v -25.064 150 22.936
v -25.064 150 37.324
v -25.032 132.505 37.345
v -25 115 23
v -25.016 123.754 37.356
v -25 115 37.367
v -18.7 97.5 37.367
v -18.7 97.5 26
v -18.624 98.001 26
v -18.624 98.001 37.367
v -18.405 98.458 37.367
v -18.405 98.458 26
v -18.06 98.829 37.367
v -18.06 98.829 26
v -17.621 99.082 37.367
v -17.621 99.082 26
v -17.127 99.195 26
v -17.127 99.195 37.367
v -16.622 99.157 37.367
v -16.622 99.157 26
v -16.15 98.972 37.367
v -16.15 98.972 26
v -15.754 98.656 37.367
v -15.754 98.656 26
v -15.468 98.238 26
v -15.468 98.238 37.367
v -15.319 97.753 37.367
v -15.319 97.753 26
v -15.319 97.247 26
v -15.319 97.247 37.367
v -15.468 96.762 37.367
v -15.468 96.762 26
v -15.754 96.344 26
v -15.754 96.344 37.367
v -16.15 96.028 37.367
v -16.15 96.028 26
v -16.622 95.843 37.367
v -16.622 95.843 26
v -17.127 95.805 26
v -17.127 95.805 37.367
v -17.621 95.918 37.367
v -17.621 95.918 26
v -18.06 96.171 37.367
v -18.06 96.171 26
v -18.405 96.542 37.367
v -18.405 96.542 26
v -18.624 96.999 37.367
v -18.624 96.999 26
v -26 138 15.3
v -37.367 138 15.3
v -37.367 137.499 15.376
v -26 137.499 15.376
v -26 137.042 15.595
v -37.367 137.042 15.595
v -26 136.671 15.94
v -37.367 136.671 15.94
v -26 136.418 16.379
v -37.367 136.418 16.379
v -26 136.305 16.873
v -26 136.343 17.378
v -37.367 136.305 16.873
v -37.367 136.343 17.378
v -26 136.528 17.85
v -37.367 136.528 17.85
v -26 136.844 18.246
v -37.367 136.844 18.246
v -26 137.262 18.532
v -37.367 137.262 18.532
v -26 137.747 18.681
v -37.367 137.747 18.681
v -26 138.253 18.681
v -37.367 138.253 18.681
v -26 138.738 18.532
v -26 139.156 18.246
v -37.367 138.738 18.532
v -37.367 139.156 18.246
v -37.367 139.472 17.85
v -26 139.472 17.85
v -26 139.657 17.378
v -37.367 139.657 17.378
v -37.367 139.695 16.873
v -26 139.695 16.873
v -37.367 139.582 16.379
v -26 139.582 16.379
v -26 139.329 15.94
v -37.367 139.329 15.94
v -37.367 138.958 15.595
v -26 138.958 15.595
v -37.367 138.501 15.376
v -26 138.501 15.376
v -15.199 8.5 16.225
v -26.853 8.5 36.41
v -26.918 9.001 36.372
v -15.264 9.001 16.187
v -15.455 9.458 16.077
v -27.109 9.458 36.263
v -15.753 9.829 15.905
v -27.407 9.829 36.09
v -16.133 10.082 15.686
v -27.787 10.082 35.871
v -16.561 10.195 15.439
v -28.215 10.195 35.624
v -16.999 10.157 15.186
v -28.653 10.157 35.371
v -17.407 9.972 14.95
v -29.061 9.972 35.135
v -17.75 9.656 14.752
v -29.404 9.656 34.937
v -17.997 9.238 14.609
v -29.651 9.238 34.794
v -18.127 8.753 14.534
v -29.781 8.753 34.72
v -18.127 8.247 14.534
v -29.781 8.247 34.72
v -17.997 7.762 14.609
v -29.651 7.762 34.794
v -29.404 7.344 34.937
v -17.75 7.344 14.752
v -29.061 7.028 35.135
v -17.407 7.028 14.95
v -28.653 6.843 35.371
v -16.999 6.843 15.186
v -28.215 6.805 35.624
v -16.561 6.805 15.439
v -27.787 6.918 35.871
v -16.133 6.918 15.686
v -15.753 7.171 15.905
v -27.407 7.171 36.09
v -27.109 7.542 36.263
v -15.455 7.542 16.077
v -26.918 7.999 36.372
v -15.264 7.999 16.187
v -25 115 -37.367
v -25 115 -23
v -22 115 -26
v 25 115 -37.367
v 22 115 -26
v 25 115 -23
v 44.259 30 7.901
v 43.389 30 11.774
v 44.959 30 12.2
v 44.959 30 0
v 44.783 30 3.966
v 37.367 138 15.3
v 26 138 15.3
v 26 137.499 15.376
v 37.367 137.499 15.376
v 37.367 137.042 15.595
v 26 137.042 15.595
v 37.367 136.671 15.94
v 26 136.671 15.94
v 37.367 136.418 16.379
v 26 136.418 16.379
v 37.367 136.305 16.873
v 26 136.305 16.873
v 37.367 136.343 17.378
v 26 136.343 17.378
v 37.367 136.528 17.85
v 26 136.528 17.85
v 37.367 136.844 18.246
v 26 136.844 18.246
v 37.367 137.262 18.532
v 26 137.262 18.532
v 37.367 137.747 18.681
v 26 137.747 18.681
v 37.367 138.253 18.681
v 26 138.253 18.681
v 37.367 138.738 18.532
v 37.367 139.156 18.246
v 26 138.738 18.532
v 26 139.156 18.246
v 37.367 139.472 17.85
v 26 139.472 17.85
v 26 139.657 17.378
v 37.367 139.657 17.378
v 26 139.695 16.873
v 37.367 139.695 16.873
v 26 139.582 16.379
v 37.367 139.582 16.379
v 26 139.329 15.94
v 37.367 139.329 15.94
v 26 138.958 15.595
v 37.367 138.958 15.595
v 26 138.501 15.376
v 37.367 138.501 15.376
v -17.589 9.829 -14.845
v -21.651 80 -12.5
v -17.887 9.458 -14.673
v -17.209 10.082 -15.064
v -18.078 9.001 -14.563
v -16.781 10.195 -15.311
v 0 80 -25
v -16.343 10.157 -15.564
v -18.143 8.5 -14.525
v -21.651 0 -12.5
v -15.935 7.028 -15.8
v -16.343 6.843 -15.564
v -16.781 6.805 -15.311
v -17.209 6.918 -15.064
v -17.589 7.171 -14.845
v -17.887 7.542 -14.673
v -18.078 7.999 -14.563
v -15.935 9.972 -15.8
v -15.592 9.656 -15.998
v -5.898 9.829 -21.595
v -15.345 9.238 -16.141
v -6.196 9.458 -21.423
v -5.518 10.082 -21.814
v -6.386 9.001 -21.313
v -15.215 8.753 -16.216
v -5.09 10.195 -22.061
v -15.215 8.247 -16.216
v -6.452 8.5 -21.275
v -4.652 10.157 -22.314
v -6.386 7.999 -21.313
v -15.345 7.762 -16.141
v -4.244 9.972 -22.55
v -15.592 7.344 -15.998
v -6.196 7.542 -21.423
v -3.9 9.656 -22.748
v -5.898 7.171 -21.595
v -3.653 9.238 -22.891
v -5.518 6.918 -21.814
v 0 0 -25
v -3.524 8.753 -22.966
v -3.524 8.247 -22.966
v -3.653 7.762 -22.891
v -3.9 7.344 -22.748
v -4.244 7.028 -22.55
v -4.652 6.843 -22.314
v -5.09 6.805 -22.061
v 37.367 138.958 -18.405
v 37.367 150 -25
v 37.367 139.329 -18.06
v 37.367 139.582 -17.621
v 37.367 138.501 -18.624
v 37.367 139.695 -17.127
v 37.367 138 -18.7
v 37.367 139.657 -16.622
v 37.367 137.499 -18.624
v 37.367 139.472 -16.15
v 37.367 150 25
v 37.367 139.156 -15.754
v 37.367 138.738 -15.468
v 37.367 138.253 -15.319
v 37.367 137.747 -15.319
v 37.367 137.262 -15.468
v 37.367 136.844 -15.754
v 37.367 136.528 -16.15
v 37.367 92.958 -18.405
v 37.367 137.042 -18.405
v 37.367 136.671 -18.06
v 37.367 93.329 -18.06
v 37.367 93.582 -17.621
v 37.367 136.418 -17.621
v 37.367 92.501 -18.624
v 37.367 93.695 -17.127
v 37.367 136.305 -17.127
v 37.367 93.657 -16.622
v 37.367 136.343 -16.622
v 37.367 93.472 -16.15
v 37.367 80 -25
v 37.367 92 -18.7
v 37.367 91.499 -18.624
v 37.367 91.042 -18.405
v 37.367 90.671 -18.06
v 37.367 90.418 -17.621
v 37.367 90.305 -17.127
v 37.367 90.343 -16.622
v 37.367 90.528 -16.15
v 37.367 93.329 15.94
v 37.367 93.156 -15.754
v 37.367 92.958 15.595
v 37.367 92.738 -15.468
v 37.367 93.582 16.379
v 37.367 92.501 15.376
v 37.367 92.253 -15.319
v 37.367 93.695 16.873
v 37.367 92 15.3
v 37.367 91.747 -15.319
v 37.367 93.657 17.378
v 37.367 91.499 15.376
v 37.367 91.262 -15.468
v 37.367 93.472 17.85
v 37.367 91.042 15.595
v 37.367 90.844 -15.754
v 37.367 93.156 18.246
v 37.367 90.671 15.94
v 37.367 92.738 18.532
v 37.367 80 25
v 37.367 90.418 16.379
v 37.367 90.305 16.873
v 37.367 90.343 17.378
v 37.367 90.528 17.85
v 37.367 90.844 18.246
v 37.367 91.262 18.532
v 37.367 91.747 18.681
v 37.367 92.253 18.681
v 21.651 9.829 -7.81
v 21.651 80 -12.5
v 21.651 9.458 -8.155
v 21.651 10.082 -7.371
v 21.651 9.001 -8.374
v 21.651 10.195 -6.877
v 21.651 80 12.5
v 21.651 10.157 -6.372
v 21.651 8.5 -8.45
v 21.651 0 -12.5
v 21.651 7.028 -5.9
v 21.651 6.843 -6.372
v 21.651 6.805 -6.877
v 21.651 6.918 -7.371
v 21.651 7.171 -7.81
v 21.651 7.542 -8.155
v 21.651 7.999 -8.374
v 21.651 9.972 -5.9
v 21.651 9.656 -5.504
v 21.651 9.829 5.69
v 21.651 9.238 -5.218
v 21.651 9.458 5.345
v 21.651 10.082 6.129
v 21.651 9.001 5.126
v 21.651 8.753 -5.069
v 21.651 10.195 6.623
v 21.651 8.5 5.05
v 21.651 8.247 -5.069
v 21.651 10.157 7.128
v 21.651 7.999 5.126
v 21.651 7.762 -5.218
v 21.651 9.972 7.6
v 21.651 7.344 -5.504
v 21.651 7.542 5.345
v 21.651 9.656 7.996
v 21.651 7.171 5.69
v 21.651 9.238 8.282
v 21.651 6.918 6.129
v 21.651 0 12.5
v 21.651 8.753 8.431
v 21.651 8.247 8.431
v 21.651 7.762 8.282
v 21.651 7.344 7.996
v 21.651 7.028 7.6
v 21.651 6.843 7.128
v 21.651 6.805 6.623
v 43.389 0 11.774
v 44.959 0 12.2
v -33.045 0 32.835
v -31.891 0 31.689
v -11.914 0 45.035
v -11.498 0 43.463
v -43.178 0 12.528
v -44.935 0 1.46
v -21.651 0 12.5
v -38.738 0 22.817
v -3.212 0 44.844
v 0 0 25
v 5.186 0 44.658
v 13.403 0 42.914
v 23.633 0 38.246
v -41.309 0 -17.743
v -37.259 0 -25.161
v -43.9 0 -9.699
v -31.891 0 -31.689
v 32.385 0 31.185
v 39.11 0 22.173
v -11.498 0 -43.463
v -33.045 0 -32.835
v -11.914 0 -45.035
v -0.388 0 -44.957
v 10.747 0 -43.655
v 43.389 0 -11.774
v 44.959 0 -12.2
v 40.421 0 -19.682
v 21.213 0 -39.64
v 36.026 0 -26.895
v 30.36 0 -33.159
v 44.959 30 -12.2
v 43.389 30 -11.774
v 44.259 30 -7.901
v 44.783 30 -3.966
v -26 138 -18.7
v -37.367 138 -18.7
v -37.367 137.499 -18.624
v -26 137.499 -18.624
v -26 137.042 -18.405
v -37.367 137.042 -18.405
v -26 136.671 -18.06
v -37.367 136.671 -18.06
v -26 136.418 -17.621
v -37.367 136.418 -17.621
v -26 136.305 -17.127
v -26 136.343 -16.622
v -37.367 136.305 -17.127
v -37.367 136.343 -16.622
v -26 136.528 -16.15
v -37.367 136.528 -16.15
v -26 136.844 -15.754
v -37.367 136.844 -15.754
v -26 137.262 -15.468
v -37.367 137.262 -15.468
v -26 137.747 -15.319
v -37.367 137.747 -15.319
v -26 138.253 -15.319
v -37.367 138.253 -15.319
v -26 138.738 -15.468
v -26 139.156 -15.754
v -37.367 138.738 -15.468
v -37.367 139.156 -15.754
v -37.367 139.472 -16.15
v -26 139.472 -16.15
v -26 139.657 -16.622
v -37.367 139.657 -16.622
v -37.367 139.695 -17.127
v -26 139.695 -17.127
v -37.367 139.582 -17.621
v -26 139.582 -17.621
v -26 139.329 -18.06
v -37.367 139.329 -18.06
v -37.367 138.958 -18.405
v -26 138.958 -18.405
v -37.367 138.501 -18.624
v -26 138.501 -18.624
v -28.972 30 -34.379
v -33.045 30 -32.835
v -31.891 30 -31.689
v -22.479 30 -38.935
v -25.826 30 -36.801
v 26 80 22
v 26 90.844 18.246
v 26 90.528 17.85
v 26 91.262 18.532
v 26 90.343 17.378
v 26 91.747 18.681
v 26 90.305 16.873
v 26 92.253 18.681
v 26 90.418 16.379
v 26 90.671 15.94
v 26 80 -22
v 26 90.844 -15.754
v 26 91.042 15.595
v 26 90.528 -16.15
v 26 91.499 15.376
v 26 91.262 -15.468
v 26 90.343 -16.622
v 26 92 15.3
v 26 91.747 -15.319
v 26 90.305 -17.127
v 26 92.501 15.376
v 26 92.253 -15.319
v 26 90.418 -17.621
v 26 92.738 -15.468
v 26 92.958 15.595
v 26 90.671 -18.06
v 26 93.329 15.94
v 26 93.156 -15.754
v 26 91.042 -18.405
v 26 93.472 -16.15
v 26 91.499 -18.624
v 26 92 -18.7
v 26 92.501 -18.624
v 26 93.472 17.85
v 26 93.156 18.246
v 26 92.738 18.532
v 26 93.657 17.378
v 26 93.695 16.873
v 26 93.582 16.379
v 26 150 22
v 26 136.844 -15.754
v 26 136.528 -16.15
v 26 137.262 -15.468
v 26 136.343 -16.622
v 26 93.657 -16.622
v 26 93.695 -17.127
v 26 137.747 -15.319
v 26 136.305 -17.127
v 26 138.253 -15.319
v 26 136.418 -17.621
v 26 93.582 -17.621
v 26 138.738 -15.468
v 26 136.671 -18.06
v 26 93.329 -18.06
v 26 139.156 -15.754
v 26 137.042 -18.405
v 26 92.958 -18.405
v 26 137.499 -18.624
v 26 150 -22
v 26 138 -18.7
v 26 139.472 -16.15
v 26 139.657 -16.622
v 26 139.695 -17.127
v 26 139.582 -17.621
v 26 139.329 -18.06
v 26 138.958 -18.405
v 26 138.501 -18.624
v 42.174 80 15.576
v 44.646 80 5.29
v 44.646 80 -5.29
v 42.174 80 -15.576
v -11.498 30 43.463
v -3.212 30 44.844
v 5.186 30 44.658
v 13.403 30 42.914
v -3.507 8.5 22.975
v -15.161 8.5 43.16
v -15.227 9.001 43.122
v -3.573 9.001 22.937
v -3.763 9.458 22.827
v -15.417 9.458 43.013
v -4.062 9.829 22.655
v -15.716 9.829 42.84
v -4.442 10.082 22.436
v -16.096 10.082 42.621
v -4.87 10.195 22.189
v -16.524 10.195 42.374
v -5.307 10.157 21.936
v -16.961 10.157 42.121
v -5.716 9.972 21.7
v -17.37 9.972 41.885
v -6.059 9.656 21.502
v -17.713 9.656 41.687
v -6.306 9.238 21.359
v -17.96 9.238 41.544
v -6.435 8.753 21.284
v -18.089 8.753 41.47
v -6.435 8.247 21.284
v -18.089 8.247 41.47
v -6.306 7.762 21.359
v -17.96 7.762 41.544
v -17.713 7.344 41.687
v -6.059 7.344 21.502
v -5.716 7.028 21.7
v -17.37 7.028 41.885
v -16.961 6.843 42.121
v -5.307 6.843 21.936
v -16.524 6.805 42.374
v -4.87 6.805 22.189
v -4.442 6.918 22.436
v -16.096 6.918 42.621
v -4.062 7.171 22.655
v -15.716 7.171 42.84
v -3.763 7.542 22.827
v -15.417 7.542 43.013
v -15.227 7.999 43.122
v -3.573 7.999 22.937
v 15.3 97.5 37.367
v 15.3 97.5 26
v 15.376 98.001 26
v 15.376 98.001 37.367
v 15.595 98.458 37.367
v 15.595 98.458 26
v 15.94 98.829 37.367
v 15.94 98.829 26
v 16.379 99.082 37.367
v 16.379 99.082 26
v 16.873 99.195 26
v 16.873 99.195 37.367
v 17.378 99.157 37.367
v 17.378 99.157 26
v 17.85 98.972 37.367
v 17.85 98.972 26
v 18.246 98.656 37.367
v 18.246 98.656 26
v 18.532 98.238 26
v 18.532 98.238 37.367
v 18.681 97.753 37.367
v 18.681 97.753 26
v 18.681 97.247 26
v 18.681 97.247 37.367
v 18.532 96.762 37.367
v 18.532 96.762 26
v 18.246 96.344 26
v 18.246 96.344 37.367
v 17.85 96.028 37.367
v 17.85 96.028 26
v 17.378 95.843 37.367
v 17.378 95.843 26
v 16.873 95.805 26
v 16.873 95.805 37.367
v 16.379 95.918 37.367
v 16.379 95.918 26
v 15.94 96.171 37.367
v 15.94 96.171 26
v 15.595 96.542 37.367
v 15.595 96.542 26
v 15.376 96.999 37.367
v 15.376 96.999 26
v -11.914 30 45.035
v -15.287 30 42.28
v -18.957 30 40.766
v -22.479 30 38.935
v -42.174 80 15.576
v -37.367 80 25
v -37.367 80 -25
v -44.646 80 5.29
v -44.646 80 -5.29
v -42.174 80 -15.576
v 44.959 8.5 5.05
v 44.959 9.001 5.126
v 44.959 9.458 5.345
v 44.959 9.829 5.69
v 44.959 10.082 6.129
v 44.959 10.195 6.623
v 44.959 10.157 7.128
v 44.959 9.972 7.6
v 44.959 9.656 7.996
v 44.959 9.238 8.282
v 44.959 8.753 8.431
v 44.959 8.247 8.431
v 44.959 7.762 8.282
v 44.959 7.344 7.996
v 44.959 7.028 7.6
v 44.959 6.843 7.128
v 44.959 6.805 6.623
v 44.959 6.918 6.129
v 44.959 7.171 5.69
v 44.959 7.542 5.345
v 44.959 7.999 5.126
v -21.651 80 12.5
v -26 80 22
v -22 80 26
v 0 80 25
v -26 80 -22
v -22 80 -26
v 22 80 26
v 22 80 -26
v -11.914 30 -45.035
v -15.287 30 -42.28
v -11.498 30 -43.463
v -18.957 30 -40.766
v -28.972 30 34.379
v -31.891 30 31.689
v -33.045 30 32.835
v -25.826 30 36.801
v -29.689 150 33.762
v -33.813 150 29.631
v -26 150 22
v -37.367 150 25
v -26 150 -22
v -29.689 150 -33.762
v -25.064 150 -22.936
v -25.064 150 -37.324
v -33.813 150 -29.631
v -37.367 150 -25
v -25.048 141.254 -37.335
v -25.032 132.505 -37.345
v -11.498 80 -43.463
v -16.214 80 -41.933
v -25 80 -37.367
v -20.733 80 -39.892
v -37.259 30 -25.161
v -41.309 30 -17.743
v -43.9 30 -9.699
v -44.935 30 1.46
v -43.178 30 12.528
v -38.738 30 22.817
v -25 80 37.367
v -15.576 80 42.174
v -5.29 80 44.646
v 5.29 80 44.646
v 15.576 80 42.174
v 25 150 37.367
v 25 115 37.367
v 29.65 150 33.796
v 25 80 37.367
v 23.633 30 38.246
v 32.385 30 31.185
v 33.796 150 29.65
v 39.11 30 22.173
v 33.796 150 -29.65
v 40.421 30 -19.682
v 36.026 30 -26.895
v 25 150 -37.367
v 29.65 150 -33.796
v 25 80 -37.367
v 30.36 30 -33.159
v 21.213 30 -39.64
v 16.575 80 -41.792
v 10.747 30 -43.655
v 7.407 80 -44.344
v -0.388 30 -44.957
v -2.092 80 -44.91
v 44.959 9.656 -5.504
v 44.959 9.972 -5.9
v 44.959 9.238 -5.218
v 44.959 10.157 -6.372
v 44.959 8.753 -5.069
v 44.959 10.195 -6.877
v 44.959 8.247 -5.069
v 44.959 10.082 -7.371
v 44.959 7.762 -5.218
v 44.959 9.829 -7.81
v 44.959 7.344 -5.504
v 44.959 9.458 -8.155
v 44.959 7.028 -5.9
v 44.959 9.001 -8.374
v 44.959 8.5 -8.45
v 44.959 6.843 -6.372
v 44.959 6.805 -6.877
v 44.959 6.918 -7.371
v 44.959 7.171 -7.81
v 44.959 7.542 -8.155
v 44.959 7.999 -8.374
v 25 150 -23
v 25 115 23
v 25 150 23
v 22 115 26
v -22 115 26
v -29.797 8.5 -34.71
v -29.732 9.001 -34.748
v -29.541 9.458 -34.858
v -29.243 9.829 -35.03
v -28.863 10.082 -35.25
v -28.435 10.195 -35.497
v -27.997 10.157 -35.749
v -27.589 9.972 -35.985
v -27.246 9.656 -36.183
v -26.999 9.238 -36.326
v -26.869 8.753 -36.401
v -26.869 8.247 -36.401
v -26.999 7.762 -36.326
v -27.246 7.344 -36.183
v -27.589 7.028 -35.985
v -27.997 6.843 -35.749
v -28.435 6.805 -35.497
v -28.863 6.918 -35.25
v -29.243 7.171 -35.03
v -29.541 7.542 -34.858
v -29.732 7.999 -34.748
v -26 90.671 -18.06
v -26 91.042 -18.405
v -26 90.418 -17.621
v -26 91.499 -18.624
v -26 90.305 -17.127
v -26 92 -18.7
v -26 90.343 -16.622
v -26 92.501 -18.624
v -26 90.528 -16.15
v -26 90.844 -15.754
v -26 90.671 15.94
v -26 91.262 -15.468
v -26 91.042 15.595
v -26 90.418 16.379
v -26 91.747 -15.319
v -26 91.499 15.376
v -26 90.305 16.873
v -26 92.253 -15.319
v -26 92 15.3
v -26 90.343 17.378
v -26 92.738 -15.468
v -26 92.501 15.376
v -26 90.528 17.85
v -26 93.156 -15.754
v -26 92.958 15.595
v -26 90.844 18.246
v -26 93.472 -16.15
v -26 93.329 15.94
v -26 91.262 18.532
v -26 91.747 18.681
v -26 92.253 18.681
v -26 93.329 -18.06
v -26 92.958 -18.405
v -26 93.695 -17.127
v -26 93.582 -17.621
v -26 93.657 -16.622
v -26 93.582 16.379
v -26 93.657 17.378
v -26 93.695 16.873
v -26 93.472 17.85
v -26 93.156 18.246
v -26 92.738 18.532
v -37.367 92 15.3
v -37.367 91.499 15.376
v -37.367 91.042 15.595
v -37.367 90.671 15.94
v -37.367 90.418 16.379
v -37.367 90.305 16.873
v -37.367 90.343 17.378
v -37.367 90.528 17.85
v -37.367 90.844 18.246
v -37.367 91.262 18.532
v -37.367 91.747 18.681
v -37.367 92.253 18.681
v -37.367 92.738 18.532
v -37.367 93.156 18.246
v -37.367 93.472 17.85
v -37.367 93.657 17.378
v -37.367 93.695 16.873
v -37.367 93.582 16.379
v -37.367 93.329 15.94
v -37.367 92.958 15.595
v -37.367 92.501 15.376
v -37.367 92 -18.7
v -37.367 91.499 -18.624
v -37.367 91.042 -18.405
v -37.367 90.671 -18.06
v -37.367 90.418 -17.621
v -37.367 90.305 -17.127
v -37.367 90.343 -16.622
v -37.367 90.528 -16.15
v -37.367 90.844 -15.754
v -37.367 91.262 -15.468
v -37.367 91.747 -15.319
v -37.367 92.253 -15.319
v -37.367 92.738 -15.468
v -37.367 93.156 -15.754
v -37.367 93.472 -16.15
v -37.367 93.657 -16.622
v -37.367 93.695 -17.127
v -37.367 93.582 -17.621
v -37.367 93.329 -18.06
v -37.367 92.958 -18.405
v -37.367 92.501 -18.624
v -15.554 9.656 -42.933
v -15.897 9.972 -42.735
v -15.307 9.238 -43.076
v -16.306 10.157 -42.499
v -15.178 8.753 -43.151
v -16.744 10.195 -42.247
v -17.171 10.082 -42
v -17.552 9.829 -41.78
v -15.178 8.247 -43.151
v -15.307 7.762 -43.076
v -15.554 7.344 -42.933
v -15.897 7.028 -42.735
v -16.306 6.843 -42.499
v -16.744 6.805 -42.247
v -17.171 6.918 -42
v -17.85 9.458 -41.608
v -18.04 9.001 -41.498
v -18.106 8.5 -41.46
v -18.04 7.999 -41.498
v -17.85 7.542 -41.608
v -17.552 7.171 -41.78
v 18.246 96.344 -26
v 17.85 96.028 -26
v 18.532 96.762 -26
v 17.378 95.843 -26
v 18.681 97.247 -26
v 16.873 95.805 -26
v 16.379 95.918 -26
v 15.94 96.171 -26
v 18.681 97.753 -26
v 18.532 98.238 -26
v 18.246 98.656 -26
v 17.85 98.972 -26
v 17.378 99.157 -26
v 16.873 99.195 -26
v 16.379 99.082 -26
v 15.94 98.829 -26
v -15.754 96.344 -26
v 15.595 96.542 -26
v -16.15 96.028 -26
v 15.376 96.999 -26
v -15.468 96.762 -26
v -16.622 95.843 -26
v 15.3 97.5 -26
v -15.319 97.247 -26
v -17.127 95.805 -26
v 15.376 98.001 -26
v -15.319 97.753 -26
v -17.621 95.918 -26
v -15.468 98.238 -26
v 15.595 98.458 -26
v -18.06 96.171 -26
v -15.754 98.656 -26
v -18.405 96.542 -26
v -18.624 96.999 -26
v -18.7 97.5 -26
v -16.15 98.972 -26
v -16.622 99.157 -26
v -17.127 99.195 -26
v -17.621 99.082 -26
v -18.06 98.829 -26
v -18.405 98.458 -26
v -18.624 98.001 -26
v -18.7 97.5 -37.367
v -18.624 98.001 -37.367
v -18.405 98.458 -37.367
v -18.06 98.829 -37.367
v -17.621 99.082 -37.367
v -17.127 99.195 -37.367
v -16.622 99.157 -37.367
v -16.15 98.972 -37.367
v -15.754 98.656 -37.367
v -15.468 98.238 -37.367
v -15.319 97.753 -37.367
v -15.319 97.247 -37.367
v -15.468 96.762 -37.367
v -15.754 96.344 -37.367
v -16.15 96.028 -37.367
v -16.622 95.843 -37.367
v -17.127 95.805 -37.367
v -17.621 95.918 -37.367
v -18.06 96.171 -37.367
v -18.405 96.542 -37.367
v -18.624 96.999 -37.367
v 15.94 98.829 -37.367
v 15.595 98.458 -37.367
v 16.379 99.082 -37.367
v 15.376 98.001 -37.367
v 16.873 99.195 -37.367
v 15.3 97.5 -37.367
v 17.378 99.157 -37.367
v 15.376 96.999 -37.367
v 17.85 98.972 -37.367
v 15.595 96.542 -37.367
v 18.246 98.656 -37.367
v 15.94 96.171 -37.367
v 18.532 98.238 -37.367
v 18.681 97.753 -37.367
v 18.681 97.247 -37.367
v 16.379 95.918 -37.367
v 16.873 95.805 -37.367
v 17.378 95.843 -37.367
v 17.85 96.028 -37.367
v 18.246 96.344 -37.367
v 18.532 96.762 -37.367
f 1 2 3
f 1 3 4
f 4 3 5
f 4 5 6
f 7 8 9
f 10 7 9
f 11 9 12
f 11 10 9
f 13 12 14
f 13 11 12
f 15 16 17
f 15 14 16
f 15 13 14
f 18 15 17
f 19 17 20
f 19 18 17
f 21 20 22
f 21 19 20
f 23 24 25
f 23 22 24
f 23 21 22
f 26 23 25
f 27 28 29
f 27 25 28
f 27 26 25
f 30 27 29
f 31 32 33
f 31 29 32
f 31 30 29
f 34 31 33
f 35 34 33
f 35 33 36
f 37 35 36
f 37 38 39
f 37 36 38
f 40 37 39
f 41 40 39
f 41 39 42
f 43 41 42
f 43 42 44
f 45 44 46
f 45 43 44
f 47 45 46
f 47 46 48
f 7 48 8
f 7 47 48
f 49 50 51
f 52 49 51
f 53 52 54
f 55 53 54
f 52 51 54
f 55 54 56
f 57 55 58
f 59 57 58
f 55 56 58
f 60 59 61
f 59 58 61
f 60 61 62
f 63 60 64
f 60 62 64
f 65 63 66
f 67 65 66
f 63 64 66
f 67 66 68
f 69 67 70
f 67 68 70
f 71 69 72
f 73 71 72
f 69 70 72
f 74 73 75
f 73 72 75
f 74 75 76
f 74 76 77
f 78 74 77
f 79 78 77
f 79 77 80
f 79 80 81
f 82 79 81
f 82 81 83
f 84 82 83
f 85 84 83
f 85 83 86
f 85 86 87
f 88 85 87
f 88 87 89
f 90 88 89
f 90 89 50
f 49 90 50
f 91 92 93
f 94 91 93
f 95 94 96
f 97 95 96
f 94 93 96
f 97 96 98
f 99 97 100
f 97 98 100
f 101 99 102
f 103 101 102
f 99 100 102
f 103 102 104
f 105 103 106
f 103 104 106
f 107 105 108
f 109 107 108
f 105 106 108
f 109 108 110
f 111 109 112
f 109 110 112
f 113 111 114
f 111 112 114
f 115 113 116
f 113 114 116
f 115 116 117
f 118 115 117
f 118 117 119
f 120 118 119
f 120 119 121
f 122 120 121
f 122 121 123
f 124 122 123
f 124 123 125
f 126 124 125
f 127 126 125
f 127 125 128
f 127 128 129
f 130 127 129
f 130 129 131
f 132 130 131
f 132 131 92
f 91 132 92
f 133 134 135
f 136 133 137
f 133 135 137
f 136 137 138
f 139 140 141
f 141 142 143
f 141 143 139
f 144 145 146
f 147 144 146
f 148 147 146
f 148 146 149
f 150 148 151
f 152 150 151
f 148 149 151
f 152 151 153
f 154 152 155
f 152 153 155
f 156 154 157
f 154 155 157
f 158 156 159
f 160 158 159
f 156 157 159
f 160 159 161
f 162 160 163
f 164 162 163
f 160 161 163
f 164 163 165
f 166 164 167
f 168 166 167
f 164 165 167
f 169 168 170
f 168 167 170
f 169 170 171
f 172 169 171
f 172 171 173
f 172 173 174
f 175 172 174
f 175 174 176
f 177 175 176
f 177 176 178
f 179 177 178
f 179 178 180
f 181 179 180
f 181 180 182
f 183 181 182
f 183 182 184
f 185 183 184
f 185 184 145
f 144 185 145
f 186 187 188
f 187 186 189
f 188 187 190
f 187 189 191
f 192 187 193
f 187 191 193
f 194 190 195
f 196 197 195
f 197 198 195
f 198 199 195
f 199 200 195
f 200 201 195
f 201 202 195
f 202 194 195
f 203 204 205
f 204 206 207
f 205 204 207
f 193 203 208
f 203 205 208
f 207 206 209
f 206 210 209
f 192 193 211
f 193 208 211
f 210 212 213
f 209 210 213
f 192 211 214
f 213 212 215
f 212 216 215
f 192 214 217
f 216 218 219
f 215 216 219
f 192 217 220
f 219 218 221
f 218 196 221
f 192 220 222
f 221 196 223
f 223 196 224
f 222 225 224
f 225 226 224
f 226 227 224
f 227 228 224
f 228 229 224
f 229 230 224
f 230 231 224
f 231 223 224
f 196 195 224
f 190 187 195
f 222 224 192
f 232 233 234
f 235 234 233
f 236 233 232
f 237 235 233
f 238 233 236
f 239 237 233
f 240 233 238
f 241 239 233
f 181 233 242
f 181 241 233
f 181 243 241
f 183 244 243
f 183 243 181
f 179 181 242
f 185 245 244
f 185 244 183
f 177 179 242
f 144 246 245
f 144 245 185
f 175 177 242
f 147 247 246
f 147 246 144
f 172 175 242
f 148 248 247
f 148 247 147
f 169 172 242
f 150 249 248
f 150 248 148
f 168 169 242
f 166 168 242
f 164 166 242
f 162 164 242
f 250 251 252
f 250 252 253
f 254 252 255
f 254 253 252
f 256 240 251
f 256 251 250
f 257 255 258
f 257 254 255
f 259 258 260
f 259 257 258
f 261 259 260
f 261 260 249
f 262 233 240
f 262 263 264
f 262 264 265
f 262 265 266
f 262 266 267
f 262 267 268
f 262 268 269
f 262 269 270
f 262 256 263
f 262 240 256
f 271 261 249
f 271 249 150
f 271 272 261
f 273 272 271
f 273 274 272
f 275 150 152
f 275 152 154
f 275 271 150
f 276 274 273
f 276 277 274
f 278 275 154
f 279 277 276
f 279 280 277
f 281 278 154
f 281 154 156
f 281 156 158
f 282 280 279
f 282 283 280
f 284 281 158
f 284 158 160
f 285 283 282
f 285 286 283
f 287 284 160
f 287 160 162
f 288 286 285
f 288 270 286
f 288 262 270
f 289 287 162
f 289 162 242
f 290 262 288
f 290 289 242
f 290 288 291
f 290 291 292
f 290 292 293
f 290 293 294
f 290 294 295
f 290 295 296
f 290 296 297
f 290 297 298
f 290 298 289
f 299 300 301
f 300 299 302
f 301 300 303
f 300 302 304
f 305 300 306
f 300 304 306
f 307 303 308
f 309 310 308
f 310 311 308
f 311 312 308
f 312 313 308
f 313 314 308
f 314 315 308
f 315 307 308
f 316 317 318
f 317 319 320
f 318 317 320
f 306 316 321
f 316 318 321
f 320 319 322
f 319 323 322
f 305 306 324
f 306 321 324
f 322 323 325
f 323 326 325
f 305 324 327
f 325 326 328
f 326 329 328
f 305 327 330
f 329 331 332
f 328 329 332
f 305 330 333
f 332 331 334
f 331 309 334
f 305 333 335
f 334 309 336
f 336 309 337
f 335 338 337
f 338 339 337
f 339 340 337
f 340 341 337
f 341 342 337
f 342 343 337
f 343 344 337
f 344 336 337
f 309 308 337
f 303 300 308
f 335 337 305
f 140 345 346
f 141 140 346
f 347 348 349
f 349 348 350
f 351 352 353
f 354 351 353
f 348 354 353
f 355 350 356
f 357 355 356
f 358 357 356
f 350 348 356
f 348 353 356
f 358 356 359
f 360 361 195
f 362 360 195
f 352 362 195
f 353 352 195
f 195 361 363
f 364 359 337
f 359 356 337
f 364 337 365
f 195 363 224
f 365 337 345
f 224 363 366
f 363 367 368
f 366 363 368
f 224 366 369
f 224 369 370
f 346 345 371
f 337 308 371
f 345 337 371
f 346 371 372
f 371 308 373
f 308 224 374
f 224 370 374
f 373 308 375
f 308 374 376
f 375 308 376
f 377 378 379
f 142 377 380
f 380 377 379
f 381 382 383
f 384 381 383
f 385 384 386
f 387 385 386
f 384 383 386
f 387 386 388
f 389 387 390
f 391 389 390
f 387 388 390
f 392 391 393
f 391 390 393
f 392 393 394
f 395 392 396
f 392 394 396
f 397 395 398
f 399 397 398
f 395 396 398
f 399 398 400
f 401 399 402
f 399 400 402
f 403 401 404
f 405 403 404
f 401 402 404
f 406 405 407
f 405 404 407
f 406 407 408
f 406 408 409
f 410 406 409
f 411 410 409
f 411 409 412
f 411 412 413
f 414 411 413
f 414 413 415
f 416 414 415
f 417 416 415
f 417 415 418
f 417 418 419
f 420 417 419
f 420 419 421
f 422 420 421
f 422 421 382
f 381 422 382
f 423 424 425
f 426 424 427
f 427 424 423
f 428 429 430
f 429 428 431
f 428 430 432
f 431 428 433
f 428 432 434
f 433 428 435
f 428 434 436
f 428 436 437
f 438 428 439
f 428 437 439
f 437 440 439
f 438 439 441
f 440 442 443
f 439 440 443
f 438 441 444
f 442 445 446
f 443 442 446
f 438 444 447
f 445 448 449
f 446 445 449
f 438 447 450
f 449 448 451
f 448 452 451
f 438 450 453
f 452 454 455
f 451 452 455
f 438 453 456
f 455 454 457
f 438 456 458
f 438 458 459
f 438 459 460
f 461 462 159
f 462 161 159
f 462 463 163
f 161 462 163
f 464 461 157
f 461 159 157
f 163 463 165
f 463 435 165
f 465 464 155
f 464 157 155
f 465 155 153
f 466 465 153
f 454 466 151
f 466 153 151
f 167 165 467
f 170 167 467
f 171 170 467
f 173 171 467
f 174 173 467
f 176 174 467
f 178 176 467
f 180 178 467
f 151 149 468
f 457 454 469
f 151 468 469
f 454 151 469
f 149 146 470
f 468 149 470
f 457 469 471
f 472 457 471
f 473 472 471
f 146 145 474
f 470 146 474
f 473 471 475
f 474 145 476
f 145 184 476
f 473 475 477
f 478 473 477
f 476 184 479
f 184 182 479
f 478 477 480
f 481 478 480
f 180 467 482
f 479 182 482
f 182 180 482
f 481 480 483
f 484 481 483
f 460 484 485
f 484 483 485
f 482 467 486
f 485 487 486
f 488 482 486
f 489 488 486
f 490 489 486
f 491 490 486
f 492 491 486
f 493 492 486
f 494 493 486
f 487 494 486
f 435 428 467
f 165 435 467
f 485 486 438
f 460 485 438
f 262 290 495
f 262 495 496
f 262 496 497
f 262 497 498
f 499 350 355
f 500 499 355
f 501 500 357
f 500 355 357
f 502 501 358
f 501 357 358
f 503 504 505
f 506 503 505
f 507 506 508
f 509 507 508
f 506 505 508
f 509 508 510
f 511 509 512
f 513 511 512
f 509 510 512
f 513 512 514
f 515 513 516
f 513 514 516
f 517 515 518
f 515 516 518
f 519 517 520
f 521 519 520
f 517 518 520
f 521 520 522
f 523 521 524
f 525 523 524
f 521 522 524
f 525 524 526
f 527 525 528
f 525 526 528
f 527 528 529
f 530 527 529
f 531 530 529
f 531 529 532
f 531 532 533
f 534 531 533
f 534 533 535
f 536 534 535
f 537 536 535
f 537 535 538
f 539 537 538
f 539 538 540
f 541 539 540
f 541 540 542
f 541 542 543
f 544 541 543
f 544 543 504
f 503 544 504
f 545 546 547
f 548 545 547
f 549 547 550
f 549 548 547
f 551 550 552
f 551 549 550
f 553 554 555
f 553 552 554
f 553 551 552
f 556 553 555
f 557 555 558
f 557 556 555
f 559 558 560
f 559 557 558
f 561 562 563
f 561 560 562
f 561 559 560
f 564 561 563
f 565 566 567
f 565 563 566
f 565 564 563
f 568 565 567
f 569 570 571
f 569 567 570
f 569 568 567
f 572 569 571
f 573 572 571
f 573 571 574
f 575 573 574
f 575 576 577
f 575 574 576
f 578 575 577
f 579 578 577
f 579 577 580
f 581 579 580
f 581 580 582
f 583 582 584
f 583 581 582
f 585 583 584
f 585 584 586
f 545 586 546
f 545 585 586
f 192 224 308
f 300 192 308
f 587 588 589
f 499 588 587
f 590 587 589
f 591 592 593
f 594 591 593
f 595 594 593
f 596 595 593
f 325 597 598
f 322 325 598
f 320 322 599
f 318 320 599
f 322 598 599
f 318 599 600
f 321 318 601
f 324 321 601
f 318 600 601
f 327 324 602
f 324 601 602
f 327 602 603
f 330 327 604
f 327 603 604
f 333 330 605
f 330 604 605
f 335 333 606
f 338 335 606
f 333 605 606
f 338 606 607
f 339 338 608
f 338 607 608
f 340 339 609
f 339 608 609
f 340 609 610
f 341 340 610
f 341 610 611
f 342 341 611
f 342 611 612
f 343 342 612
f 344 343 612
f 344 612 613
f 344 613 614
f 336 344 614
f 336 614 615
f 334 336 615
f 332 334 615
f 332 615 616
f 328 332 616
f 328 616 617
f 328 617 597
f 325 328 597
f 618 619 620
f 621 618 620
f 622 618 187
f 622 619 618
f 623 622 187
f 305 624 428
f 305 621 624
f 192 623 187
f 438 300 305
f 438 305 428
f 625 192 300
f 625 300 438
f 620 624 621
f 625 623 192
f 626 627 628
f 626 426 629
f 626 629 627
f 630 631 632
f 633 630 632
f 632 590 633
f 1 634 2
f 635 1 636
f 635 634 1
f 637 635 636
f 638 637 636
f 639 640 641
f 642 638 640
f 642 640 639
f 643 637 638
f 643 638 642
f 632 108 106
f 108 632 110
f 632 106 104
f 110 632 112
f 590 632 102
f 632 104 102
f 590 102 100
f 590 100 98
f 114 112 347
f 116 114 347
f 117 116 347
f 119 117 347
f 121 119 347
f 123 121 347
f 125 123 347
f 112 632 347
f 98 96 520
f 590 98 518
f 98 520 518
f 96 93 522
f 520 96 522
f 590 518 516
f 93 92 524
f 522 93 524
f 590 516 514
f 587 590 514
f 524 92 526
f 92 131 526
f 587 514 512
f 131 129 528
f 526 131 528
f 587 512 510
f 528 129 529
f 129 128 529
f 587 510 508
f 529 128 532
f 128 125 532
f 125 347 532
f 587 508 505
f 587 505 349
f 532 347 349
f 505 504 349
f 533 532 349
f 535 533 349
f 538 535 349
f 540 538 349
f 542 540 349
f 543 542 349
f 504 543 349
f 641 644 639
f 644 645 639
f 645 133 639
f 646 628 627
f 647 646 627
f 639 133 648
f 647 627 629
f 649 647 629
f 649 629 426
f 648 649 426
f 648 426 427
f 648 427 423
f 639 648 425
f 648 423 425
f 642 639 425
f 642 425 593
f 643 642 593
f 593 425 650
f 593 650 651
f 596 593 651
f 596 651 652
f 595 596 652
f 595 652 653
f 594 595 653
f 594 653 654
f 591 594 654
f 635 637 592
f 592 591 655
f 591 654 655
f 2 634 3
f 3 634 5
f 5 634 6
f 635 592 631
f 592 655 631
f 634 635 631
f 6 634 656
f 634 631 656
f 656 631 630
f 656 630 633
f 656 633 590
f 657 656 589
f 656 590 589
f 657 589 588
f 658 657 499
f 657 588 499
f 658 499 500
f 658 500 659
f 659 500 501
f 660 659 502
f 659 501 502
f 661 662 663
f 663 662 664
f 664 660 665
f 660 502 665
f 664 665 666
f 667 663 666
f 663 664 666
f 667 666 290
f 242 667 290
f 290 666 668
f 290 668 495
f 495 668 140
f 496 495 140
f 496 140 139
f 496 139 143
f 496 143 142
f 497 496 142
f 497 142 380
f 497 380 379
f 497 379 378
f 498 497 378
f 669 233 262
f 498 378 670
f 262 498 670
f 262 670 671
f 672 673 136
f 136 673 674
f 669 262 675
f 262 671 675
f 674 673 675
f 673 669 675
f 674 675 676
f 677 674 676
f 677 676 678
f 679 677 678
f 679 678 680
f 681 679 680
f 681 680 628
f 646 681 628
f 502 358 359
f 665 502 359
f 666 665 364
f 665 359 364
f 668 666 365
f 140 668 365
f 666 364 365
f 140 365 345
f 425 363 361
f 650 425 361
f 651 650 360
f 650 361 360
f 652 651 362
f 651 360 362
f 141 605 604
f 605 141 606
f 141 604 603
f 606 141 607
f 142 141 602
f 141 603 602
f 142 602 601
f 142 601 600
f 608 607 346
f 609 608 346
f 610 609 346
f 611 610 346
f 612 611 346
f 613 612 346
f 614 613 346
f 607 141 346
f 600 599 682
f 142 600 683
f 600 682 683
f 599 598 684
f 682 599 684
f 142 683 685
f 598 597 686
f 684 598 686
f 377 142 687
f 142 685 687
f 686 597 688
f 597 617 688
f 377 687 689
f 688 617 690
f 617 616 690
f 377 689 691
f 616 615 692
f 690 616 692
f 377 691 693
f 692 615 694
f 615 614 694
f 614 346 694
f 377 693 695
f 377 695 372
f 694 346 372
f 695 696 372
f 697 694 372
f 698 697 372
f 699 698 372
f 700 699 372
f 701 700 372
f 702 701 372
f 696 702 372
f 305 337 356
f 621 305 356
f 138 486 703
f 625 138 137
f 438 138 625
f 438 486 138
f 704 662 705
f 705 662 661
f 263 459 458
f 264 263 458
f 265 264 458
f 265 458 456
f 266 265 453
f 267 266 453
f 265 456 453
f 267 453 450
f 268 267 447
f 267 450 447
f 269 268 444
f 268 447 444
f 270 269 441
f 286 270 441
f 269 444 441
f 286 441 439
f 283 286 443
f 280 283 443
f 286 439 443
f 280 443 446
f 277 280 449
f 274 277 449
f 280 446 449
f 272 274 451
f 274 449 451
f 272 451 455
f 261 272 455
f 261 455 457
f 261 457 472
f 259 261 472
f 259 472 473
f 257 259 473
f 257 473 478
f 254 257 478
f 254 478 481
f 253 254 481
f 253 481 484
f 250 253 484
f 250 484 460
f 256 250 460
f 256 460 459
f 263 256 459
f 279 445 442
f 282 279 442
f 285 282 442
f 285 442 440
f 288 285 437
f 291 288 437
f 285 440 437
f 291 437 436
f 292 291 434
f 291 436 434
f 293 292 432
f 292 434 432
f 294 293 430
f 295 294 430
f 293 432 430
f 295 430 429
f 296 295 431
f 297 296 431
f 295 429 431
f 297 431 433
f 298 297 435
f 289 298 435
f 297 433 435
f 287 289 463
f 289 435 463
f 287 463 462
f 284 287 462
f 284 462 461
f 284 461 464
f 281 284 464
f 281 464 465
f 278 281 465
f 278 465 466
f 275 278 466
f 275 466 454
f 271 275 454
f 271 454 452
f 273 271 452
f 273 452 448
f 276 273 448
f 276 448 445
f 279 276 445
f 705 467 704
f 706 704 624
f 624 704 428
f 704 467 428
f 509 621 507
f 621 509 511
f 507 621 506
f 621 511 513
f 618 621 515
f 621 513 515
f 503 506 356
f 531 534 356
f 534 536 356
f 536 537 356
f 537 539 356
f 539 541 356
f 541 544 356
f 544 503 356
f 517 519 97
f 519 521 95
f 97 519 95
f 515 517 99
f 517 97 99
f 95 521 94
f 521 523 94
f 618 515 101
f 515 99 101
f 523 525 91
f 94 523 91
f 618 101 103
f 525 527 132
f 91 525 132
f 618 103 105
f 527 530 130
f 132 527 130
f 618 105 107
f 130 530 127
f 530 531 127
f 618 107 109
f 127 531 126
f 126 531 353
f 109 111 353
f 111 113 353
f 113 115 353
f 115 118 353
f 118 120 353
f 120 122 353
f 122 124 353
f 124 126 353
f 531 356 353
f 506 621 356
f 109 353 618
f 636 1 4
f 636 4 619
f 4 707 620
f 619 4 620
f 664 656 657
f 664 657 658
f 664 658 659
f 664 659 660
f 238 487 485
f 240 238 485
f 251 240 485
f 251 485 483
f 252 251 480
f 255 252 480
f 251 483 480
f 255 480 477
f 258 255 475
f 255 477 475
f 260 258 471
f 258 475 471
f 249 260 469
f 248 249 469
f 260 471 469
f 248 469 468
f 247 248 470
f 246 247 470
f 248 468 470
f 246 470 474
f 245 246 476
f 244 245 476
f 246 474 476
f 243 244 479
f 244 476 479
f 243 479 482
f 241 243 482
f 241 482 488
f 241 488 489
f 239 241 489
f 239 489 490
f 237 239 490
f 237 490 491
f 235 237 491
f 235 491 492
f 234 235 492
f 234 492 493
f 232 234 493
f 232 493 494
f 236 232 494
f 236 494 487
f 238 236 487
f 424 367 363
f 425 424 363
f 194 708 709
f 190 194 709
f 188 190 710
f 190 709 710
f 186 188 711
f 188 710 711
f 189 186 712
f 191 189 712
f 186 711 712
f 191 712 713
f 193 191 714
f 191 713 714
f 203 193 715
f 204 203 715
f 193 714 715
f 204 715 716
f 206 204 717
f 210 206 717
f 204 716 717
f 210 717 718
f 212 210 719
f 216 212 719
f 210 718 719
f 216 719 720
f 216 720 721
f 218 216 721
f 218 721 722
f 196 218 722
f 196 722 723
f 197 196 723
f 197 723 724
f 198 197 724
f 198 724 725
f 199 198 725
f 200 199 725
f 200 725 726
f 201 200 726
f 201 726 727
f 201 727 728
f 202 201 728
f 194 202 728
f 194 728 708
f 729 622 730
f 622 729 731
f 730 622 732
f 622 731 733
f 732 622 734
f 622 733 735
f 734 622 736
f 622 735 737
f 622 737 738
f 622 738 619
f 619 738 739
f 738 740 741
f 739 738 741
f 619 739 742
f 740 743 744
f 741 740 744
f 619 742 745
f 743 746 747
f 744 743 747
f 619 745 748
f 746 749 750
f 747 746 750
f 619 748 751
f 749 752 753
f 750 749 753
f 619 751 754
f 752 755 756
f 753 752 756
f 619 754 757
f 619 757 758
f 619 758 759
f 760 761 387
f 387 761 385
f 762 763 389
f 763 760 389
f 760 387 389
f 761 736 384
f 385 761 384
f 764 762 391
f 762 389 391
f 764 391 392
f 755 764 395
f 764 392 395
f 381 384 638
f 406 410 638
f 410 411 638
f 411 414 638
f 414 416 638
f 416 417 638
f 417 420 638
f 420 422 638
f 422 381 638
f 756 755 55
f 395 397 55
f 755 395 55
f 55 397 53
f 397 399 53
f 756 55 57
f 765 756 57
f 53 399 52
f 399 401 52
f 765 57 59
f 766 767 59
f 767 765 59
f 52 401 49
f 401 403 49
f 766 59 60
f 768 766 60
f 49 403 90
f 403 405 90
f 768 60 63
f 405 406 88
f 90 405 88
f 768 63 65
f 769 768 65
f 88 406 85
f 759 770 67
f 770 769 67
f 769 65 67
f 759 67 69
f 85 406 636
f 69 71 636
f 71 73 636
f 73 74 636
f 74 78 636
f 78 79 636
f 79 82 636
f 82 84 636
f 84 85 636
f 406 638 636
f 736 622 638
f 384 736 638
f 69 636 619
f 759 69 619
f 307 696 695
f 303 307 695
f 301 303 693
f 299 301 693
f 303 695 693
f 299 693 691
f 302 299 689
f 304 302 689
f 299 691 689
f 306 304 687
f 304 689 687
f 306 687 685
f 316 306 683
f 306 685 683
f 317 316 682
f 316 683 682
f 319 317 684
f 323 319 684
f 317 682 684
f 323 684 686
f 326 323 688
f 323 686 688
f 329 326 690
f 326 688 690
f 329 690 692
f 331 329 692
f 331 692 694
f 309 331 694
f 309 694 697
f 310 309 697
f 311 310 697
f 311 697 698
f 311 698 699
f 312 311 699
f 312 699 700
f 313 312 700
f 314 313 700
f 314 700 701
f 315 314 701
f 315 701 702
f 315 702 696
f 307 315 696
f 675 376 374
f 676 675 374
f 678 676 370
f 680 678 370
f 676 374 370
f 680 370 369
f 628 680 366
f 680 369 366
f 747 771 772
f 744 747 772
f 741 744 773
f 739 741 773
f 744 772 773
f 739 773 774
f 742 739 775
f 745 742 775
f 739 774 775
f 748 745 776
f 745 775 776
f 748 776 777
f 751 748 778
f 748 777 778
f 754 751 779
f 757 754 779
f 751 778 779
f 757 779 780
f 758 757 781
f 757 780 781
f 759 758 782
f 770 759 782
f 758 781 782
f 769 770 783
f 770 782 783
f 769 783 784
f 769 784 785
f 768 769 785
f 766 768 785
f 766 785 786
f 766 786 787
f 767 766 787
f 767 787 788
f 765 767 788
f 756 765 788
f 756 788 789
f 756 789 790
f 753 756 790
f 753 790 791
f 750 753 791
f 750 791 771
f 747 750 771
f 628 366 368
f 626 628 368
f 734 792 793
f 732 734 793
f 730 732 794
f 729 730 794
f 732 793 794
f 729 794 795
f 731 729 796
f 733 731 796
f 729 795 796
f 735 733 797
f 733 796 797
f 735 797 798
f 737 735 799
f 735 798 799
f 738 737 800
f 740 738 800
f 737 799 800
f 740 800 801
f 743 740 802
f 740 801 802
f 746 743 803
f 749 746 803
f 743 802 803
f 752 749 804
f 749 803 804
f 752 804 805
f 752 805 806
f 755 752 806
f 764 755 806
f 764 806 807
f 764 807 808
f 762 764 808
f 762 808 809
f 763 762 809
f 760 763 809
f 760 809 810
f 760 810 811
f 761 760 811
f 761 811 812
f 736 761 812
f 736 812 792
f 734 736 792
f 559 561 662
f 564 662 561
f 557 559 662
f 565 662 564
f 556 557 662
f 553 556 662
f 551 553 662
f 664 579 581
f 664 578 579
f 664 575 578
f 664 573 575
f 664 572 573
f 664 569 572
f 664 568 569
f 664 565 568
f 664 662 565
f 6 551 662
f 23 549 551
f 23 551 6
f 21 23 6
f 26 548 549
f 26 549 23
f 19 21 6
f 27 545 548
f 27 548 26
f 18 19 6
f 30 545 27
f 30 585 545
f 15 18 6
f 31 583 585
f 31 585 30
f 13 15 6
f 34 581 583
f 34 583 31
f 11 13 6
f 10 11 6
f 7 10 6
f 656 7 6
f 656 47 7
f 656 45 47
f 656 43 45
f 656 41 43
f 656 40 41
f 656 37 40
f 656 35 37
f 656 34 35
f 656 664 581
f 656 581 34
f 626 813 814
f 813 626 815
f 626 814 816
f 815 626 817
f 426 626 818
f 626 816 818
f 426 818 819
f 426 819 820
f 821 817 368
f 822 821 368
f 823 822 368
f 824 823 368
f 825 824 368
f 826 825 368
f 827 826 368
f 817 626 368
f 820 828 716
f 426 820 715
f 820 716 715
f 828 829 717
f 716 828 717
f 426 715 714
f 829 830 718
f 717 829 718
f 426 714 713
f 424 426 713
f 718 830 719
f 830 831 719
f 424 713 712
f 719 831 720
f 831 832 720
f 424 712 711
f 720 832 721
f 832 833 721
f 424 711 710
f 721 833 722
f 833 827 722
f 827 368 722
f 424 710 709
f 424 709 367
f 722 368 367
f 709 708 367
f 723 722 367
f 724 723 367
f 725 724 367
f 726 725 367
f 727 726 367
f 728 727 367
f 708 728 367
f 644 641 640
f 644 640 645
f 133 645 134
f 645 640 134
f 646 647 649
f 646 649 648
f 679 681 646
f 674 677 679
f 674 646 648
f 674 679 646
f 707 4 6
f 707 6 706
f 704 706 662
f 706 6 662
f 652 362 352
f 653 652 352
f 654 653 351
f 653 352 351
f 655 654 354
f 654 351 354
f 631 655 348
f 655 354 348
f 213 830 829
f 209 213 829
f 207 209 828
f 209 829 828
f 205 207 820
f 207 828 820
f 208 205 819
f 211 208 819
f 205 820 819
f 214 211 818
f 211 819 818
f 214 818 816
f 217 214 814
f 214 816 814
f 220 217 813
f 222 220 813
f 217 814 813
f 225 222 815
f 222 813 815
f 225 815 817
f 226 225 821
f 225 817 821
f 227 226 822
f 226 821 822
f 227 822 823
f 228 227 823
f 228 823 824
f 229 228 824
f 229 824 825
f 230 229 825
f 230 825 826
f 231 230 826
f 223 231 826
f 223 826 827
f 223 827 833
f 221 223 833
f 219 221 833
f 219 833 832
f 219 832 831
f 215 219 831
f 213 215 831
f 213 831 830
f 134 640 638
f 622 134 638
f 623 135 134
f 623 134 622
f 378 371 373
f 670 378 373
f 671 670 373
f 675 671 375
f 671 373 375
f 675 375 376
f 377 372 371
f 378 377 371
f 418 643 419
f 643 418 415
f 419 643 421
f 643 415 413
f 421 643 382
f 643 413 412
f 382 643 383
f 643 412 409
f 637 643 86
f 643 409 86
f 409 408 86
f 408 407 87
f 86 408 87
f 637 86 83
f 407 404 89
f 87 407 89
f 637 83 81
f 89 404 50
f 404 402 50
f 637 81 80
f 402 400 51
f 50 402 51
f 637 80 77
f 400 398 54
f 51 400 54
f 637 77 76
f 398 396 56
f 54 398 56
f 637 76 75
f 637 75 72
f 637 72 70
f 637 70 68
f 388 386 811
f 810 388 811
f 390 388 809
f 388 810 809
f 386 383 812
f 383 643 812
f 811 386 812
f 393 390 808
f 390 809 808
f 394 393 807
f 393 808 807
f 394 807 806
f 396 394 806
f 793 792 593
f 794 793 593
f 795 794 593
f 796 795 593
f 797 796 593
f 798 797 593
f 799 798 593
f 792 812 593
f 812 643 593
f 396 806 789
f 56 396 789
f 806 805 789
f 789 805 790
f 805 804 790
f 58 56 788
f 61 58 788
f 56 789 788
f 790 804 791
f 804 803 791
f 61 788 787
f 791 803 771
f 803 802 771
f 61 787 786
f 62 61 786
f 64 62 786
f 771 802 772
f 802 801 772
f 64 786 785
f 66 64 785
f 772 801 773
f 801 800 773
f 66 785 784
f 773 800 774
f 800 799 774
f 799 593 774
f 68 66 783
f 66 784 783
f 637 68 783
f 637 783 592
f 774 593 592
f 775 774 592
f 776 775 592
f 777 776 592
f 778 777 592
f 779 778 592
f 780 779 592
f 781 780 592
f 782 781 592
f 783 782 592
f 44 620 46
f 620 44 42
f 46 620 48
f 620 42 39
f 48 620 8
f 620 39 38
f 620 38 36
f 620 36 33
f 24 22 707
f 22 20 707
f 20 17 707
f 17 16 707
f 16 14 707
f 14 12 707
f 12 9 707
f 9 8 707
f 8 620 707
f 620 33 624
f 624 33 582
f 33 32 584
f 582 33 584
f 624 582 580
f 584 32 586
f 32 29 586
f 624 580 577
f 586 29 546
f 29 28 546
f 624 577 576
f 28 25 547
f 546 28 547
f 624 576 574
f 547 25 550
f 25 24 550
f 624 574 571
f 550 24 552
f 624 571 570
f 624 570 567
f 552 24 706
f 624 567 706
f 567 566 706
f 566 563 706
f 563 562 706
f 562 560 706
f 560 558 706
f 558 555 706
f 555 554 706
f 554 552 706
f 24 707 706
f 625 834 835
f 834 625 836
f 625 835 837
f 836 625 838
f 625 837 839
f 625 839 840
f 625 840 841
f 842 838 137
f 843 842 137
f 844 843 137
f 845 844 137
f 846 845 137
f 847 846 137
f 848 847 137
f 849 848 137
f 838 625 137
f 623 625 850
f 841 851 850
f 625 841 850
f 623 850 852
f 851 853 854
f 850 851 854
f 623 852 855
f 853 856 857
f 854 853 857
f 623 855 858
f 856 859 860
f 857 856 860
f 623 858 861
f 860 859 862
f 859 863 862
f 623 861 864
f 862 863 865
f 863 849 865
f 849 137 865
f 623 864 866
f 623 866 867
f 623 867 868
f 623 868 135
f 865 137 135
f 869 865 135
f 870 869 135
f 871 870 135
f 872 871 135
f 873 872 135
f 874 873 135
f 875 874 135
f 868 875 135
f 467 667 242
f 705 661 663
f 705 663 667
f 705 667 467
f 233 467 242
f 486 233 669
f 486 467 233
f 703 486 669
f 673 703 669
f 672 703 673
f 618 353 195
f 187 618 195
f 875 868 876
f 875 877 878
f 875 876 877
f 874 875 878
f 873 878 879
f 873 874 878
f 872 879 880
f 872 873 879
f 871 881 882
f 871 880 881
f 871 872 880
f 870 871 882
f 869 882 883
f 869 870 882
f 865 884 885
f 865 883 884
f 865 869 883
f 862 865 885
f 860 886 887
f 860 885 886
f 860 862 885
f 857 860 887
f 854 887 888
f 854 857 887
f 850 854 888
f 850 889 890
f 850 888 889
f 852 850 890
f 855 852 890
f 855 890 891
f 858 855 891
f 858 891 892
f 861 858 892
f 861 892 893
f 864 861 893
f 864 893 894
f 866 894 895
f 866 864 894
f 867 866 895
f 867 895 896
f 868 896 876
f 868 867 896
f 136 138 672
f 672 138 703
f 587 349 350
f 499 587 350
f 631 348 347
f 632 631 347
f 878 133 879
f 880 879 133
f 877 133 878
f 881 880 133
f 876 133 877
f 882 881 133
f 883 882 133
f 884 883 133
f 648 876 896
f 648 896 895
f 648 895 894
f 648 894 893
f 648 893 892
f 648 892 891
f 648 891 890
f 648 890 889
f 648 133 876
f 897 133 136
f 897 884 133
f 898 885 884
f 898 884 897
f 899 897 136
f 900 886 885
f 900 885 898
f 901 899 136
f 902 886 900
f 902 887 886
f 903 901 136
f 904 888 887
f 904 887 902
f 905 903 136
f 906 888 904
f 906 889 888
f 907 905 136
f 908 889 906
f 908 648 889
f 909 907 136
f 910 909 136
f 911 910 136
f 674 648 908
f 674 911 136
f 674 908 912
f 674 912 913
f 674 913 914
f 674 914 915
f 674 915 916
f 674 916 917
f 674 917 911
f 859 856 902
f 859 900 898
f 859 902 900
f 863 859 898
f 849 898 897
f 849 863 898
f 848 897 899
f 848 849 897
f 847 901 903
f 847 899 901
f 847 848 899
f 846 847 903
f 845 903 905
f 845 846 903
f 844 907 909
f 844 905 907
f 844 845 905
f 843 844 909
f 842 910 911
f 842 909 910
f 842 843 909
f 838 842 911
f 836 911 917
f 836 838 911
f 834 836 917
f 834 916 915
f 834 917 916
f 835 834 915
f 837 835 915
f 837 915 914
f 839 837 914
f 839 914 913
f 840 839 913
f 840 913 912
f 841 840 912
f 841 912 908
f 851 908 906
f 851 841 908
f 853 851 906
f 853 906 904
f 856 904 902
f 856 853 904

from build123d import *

# Parameters (mm, degrees)
BOSS_EXTRUDE1_DEPTH      = 30
SKETCH11_R               = 44.958564256
BOSS_EXTRUDE2_DEPTH      = 120
CUT_EXTRUDE1_DEPTH       = 163.940010531
SKETCH20_R               = 1.7
CUT_EXTRUDE13_DEPTH      = 24
SKETCH22_R               = 1.7
CUT_EXTRUDE14_DEPTH      = 24
SKETCH23_R               = 1.7
CUT_EXTRUDE15_DEPTH      = 24
CUT_EXTRUDE21_START      = -70
CUT_EXTRUDE21_DEPTH      = 70
CUT_EXTRUDE22_DEPTH      = 70
CIRPATTERN1_START        = 80
CIRPATTERN1_DEPTH        = 70
CHAMFER1_SIZE            = 4
SKETCH37_R               = 1.7
CUT_EXTRUDE23_DEPTH      = 177.933966729
CUT_EXTRUDE24_DEPTH      = 177.95016312
CUT_EXTRUDE24_DEPTH_BACK = 177.95016312
CUT_EXTRUDE25_DEPTH      = 177.95016312
CUT_EXTRUDE25_DEPTH_BACK = 177.95016312
SKETCH39_R               = 1.7


# Read off the part's stored shape, not the designer's step: CirPattern1
with BuildPart() as part:
    # Sketch2 → Boss-Extrude1 (new body)
    with BuildSketch(Plane(origin=(0, 0, 0), x_dir=(1, 0, 0), z_dir=(0, 1, 0))):
        with BuildLine():
            Line((-33.044792054, -32.835258764), (-11.913772202, -45.035258764))
            Line((-11.913772202, -45.035258764), (-11.497954912, -43.463427532))
            ThreePointArc((-11.497954912, -43.463427532), (0.991222154, -44.947635963), (13.402827335, -42.914295048))
            ThreePointArc((13.402827335, -42.914295048), (32.384657539, -31.185035772), (43.389409835, -11.77419272))
            Line((43.389409835, -11.77419272), (44.958564256, -12.2))
            Line((44.958564256, -12.2), (44.958564256, 12.2))
            Line((44.958564256, 12.2), (43.389409835, 11.77419272))
            ThreePointArc((43.389409835, 11.77419272), (38.393686215, 23.392249973), (30.359999068, 33.159356999))
            ThreePointArc((30.359999068, 33.159356999), (10.7465178, 43.655295843), (-11.497954912, 43.463427532))
            Line((-11.497954912, 43.463427532), (-11.913772202, 45.035258764))
            Line((-11.913772202, 45.035258764), (-33.044792054, 32.835258764))
            Line((-33.044792054, 32.835258764), (-31.891454922, 31.689234812))
            ThreePointArc((-31.891454922, 31.689234812), (-39.458623491, 21.547378777), (-43.899995544, 9.698602542))
            ThreePointArc((-43.899995544, 9.698602542), (-43.177821403, -12.527898422), (-31.891454922, -31.689234812))
            Line((-31.891454922, -31.689234812), (-33.044792054, -32.835258764))
        make_face()
    extrude(amount=BOSS_EXTRUDE1_DEPTH)

    # Sketch11 → Boss-Extrude2 (add)
    with BuildSketch(Plane(origin=(0, 30, 0), x_dir=(1, 0, 0), z_dir=(0, 1, 0))):
        with Locations(Location((0, 0, 0), (0, 0, 104.817769832))):
            Circle(SKETCH11_R)
    extrude(amount=BOSS_EXTRUDE2_DEPTH)

    # Sketch3 → Cut-Extrude1 (cut, through all)
    with BuildSketch(Plane(origin=(0, 0, 0), x_dir=(-1, 0, 0), z_dir=(0, -1, 0))):
        Polygon((21.650635095, 12.5), (0, 25), (-21.650635095, 12.5), (-21.650635095, -12.5), (0, -25), (21.650635095, -12.5), align=None)
    extrude(amount=-CUT_EXTRUDE1_DEPTH, mode=Mode.SUBTRACT)

    # Sketch20 → Cut-Extrude13 (cut)
    with BuildSketch(Plane(origin=(44.958564256, 0, 0), x_dir=(0, 0, -1), z_dir=(1, 0, 0))):
        with Locations((-6.75, 8.5)):
            Circle(SKETCH20_R)
        with Locations((6.75, 8.5)):
            Circle(SKETCH20_R)
    extrude(amount=-CUT_EXTRUDE13_DEPTH, mode=Mode.SUBTRACT)

    # Sketch22 → Cut-Extrude14 (cut)
    with BuildSketch(Plane(origin=(-22.479282128, 0, -38.935258764), x_dir=(-0.8660254037844386, 0, 0.5000000000000003), z_dir=(-0.5000000000000002, 0, -0.8660254037844385))):
        with Locations((6.75, 8.5)):
            Circle(SKETCH22_R)
        with Locations((-6.75, 8.5)):
            Circle(SKETCH22_R)
    extrude(amount=-CUT_EXTRUDE14_DEPTH, mode=Mode.SUBTRACT)

    # Sketch23 → Cut-Extrude15 (cut)
    with BuildSketch(Plane(origin=(-22.479282128, 0, 38.935258764), x_dir=(0.8660254037844386, 0, 0.5), z_dir=(-0.5000000000000001, 0, 0.8660254037844387))):
        with Locations((-6.75, 8.5)):
            Circle(SKETCH23_R)
        with Locations((6.75, 8.5)):
            Circle(SKETCH23_R)
    extrude(amount=-CUT_EXTRUDE15_DEPTH, mode=Mode.SUBTRACT)

    # Sketch35 → Cut-Extrude21 (cut)
    with BuildSketch(Plane(origin=(0, 150, 0), x_dir=(1, 0, 0), z_dir=(0, 1, 0)).offset(CUT_EXTRUDE21_START)):
        with BuildLine():
            Line((-37.366729854, 25), (-37.366729854, -25))
            ThreePointArc((-37.366729854, -25), (-44.958564256, 0), (-37.366729854, 25))
        make_face()
    extrude(amount=CUT_EXTRUDE21_DEPTH, mode=Mode.SUBTRACT)

    # Sketch36 → Cut-Extrude22 (cut)
    with BuildSketch(Plane(origin=(0, 150, 0), x_dir=(1, 0, 0), z_dir=(0, 1, 0))):
        Polygon((-26, 26), (-26, 0), (-26, -26), (0, -26), (26, -26), (26, 0), (26, 26), (0, 26), align=None)
    extrude(amount=-CUT_EXTRUDE22_DEPTH, mode=Mode.SUBTRACT)

    # CirPattern1 outline → CirPattern1 (cut)
    with BuildSketch(Plane(origin=(0, 0, 0), x_dir=(1, 0, 0), z_dir=(0, 1, 0)).offset(CIRPATTERN1_START)):
        with BuildLine():
            Line((25, -37.366729854), (-25, -37.366729854))
            ThreePointArc((-25, -37.366729854), (0, -44.958564256), (25, -37.366729854))
        make_face()
        with BuildLine():
            ThreePointArc((25, 37.366729854), (0, 44.958564256), (-25, 37.366729854))
            Line((-25, 37.366729854), (25, 37.366729854))
        make_face()
        with BuildLine():
            Line((37.366729854, 25), (37.366729854, -25))
            ThreePointArc((37.366729854, -25), (44.958564256, 0), (37.366729854, 25))
        make_face()
    extrude(amount=CIRPATTERN1_DEPTH, mode=Mode.SUBTRACT)

    # Chamfer1
    chamfer1_edges = [part.edges().sort_by_distance(p)[0] for p in [
        (-26, 115, -26),
        (26, 115, -26),
        (26, 115, 26),
        (-26, 115, 26),
    ]]
    chamfer(chamfer1_edges, length=CHAMFER1_SIZE)

    # Sketch37 → Cut-Extrude23 (cut, through all)
    with BuildSketch(Plane.ZY.offset(37.366729854)):
        with Locations(Location((-17, 138, 0), (0, 0, 180))):
            Circle(SKETCH37_R)
        with Locations(Location((-17, 92, 0), (0, 0, 180))):
            Circle(SKETCH37_R)
        with Locations(Location((17, 92, 0), (0, 0, 180))):
            Circle(SKETCH37_R)
        with Locations(Location((17, 138, 0), (0, 0, 180))):
            Circle(SKETCH37_R)
    extrude(amount=-CUT_EXTRUDE23_DEPTH, mode=Mode.SUBTRACT)

    # Sketch38 → Cut-Extrude24 (cut, two sides: drawn at the far end of the back side and taken through both)
    with BuildSketch(Plane(origin=(0, 0, -37.366729854), x_dir=(-1, 0, 0), z_dir=(0, 0, -1)).offset(-CUT_EXTRUDE24_DEPTH_BACK)):
        Polygon((-25, 150), (25.064026091, 150), (25, 115), (-25, 115), align=None)
    extrude(amount=CUT_EXTRUDE24_DEPTH + CUT_EXTRUDE24_DEPTH_BACK, mode=Mode.SUBTRACT)

    # Sketch39 → Cut-Extrude25 (cut, two sides: drawn at the far end of the back side and taken through both)
    with BuildSketch(Plane(origin=(0, 0, -37.366729854), x_dir=(-1, 0, 0), z_dir=(0, 0, -1)).offset(-CUT_EXTRUDE25_DEPTH_BACK)):
        with Locations((-17, 97.5)):
            Circle(SKETCH39_R)
        with Locations((17, 97.5)):
            Circle(SKETCH39_R)
    extrude(amount=CUT_EXTRUDE25_DEPTH + CUT_EXTRUDE25_DEPTH_BACK, mode=Mode.SUBTRACT)


solid = part.part
